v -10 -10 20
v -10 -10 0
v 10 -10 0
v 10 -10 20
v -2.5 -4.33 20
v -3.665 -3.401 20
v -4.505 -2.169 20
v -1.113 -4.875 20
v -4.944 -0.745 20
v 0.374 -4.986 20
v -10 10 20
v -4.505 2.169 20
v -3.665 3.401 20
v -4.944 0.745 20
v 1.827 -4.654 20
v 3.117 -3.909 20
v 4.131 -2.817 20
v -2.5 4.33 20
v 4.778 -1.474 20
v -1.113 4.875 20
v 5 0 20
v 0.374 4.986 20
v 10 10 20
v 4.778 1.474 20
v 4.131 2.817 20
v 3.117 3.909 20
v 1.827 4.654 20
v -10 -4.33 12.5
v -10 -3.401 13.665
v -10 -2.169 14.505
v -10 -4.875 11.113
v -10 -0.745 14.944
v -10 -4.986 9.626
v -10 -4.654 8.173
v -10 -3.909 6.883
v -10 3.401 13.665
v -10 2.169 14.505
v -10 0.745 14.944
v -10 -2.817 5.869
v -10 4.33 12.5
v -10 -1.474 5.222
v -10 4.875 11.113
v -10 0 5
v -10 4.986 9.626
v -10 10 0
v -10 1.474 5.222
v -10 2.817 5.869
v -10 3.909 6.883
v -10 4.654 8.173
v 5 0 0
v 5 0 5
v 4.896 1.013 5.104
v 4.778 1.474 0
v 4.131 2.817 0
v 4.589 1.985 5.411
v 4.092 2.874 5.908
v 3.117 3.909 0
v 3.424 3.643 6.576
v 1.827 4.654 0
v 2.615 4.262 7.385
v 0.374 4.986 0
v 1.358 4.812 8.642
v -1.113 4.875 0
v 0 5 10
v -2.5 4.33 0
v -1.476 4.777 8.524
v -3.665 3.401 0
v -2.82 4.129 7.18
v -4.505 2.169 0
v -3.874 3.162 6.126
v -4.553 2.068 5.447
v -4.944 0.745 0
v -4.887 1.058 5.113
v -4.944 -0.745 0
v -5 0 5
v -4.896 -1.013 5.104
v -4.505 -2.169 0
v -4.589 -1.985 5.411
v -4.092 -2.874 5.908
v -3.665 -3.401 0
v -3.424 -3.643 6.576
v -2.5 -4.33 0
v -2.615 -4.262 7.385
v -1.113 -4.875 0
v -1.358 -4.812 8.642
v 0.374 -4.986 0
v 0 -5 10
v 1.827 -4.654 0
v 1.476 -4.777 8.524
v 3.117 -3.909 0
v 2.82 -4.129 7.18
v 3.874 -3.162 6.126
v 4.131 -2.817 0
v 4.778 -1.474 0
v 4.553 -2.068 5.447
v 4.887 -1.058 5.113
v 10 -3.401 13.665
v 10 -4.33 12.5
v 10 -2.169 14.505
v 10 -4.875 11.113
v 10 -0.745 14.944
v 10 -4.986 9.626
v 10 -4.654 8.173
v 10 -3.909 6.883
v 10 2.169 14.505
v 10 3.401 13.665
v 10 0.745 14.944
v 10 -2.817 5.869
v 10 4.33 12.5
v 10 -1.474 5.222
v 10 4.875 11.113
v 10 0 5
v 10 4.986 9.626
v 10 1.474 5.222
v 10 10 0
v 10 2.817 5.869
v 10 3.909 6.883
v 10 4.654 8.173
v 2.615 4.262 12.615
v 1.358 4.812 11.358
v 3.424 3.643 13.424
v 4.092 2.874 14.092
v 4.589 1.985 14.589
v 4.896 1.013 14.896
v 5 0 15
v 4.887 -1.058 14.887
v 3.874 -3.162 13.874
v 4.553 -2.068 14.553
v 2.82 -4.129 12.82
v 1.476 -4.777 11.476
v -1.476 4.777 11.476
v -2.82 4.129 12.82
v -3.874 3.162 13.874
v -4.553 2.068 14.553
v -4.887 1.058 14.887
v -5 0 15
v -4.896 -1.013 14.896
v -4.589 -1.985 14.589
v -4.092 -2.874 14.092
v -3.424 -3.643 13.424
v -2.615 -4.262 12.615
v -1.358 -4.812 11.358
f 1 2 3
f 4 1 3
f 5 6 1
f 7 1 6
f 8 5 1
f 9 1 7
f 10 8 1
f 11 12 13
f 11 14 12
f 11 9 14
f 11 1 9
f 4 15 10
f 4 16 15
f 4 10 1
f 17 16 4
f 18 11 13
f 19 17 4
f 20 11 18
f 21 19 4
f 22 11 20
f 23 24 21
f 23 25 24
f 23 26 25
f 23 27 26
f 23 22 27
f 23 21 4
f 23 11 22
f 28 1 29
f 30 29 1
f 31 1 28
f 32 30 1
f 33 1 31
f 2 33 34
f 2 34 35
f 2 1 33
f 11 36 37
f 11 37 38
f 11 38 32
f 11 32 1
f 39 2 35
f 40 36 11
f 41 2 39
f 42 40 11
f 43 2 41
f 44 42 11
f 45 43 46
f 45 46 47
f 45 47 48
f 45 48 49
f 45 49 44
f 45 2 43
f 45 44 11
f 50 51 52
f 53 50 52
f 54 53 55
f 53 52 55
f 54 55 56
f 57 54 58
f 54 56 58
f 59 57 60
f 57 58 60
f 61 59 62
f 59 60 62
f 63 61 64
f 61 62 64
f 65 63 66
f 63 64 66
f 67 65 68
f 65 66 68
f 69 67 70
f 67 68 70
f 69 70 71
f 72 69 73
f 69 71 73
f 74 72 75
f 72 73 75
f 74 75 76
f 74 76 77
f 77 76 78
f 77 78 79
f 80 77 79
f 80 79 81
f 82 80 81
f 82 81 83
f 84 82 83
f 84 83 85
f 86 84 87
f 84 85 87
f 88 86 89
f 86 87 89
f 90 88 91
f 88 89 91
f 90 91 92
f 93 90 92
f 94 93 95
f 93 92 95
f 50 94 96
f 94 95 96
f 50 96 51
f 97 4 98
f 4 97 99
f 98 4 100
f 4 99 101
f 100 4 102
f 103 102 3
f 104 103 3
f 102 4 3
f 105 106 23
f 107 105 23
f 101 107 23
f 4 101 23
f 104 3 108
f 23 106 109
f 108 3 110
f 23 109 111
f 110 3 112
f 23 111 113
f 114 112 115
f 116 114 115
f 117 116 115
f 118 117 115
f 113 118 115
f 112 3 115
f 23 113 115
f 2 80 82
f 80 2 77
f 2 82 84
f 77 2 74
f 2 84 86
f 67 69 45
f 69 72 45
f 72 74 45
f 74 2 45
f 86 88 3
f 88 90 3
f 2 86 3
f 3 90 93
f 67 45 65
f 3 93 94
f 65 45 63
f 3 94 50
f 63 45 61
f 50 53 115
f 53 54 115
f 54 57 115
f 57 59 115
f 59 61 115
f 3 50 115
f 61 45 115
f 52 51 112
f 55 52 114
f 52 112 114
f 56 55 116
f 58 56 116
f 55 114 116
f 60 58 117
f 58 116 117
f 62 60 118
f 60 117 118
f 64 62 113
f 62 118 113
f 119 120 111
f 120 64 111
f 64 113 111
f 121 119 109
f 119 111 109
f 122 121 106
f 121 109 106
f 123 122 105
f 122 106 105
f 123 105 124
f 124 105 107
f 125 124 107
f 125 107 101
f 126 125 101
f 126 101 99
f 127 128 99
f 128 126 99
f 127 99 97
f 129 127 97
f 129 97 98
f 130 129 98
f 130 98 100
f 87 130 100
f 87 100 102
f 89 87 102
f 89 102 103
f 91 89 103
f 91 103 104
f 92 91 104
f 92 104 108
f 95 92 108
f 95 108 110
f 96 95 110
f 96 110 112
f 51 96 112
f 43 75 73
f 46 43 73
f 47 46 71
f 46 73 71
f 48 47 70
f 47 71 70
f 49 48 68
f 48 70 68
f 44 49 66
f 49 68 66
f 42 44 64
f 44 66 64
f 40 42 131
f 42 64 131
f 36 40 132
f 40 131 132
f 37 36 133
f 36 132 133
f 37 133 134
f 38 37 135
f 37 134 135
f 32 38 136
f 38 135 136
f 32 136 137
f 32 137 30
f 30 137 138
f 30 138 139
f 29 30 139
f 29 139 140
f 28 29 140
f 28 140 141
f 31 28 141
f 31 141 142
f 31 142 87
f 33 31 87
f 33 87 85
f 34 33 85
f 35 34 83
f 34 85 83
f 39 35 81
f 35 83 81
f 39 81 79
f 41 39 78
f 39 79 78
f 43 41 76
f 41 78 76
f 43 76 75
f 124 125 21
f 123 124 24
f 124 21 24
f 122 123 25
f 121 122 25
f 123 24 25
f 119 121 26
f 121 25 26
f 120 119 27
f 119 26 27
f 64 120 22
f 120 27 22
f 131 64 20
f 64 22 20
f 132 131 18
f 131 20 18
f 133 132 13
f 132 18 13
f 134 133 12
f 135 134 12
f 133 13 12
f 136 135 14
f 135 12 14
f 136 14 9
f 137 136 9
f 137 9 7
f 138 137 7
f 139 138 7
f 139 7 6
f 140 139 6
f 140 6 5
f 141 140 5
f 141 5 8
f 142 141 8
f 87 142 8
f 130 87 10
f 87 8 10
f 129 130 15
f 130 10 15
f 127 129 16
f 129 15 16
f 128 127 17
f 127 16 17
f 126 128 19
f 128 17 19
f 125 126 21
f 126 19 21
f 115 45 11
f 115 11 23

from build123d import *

# Parameters (mm, degrees)
SKETCH1_W           = 20
SKETCH1_H           = 20
BOSS_EXTRUDE1_DEPTH = 20
SKETCH2_R           = 5
CUT_EXTRUDE1_DEPTH  = 20
SKETCH3_R           = 5
CUT_EXTRUDE2_DEPTH  = 20


with BuildPart() as part:
    # Sketch1 → Boss-Extrude1 (new body)
    with BuildSketch(Plane.XY):
        Rectangle(SKETCH1_W, SKETCH1_H)
    extrude(amount=BOSS_EXTRUDE1_DEPTH)

    # Sketch2 → Cut-Extrude1 (cut)
    with BuildSketch(Plane.XY.offset(20)):
        Circle(SKETCH2_R)
    extrude(amount=-CUT_EXTRUDE1_DEPTH, mode=Mode.SUBTRACT)

    # Sketch3 → Cut-Extrude2 (cut)
    with BuildSketch(Plane(origin=(10, 0, 0), x_dir=(0, 0, -1), z_dir=(1, 0, 0))):
        with Locations((-10, 0)):
            Circle(SKETCH3_R)
    extrude(amount=-CUT_EXTRUDE2_DEPTH, mode=Mode.SUBTRACT)


solid = part.part
